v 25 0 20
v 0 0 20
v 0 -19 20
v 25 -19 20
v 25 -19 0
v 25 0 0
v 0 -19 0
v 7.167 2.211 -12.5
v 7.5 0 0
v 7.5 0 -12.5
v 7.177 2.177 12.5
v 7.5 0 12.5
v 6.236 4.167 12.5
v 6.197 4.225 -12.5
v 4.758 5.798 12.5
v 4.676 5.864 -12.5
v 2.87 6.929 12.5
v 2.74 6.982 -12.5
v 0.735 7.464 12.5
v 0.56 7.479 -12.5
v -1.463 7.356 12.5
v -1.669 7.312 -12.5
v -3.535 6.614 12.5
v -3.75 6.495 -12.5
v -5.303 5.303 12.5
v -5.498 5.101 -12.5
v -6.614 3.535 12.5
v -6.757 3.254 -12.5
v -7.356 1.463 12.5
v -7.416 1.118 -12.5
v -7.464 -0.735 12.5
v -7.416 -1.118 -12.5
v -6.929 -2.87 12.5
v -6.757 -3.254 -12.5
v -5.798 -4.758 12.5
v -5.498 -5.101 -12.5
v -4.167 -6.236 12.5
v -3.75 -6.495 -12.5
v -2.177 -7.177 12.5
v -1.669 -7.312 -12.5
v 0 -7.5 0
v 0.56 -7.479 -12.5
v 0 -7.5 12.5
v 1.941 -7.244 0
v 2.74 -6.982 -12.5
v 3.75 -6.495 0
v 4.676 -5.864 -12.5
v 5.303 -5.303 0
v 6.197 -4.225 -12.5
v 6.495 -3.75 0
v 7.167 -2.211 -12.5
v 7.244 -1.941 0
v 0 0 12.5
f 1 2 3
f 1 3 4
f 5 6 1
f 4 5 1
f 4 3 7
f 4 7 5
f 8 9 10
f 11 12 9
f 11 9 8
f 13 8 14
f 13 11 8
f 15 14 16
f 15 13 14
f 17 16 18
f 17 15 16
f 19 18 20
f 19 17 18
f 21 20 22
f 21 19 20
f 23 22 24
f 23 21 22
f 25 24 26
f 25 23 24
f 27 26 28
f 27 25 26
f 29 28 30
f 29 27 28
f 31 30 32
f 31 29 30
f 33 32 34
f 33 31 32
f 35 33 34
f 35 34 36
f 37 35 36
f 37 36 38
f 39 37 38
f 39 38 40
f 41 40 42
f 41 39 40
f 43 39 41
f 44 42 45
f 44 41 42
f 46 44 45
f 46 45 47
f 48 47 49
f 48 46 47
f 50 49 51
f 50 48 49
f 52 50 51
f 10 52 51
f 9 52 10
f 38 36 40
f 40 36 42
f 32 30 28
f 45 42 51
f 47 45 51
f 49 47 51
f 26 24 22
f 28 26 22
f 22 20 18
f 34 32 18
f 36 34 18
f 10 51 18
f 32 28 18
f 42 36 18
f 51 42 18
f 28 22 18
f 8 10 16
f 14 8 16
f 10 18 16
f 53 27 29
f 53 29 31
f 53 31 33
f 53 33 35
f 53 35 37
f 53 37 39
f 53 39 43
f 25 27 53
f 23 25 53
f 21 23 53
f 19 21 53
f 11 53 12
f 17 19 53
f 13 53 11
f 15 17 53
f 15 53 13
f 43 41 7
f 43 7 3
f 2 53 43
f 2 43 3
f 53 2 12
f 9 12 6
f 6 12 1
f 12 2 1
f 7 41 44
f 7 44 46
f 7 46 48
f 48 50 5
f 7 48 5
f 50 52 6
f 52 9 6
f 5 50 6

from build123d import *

# Parameters (mm, degrees)
SKETCH_W     = 25
SKETCH_H     = 20
PAD_DEPTH    = 19
SKETCH001_R  = 7.5
PAD001_DEPTH = 12.5


with BuildPart() as part:
    # Sketch → Pad (new body)
    with BuildSketch(Plane.XZ):
        with Locations((12.5, 10)):
            Rectangle(SKETCH_W, SKETCH_H)
    extrude(amount=PAD_DEPTH)

    # Sketch001 → Pad001 (join, symmetric)
    with BuildSketch(Plane.XY):
        Circle(SKETCH001_R)
    extrude(amount=PAD001_DEPTH, both=True)


solid = part.part
